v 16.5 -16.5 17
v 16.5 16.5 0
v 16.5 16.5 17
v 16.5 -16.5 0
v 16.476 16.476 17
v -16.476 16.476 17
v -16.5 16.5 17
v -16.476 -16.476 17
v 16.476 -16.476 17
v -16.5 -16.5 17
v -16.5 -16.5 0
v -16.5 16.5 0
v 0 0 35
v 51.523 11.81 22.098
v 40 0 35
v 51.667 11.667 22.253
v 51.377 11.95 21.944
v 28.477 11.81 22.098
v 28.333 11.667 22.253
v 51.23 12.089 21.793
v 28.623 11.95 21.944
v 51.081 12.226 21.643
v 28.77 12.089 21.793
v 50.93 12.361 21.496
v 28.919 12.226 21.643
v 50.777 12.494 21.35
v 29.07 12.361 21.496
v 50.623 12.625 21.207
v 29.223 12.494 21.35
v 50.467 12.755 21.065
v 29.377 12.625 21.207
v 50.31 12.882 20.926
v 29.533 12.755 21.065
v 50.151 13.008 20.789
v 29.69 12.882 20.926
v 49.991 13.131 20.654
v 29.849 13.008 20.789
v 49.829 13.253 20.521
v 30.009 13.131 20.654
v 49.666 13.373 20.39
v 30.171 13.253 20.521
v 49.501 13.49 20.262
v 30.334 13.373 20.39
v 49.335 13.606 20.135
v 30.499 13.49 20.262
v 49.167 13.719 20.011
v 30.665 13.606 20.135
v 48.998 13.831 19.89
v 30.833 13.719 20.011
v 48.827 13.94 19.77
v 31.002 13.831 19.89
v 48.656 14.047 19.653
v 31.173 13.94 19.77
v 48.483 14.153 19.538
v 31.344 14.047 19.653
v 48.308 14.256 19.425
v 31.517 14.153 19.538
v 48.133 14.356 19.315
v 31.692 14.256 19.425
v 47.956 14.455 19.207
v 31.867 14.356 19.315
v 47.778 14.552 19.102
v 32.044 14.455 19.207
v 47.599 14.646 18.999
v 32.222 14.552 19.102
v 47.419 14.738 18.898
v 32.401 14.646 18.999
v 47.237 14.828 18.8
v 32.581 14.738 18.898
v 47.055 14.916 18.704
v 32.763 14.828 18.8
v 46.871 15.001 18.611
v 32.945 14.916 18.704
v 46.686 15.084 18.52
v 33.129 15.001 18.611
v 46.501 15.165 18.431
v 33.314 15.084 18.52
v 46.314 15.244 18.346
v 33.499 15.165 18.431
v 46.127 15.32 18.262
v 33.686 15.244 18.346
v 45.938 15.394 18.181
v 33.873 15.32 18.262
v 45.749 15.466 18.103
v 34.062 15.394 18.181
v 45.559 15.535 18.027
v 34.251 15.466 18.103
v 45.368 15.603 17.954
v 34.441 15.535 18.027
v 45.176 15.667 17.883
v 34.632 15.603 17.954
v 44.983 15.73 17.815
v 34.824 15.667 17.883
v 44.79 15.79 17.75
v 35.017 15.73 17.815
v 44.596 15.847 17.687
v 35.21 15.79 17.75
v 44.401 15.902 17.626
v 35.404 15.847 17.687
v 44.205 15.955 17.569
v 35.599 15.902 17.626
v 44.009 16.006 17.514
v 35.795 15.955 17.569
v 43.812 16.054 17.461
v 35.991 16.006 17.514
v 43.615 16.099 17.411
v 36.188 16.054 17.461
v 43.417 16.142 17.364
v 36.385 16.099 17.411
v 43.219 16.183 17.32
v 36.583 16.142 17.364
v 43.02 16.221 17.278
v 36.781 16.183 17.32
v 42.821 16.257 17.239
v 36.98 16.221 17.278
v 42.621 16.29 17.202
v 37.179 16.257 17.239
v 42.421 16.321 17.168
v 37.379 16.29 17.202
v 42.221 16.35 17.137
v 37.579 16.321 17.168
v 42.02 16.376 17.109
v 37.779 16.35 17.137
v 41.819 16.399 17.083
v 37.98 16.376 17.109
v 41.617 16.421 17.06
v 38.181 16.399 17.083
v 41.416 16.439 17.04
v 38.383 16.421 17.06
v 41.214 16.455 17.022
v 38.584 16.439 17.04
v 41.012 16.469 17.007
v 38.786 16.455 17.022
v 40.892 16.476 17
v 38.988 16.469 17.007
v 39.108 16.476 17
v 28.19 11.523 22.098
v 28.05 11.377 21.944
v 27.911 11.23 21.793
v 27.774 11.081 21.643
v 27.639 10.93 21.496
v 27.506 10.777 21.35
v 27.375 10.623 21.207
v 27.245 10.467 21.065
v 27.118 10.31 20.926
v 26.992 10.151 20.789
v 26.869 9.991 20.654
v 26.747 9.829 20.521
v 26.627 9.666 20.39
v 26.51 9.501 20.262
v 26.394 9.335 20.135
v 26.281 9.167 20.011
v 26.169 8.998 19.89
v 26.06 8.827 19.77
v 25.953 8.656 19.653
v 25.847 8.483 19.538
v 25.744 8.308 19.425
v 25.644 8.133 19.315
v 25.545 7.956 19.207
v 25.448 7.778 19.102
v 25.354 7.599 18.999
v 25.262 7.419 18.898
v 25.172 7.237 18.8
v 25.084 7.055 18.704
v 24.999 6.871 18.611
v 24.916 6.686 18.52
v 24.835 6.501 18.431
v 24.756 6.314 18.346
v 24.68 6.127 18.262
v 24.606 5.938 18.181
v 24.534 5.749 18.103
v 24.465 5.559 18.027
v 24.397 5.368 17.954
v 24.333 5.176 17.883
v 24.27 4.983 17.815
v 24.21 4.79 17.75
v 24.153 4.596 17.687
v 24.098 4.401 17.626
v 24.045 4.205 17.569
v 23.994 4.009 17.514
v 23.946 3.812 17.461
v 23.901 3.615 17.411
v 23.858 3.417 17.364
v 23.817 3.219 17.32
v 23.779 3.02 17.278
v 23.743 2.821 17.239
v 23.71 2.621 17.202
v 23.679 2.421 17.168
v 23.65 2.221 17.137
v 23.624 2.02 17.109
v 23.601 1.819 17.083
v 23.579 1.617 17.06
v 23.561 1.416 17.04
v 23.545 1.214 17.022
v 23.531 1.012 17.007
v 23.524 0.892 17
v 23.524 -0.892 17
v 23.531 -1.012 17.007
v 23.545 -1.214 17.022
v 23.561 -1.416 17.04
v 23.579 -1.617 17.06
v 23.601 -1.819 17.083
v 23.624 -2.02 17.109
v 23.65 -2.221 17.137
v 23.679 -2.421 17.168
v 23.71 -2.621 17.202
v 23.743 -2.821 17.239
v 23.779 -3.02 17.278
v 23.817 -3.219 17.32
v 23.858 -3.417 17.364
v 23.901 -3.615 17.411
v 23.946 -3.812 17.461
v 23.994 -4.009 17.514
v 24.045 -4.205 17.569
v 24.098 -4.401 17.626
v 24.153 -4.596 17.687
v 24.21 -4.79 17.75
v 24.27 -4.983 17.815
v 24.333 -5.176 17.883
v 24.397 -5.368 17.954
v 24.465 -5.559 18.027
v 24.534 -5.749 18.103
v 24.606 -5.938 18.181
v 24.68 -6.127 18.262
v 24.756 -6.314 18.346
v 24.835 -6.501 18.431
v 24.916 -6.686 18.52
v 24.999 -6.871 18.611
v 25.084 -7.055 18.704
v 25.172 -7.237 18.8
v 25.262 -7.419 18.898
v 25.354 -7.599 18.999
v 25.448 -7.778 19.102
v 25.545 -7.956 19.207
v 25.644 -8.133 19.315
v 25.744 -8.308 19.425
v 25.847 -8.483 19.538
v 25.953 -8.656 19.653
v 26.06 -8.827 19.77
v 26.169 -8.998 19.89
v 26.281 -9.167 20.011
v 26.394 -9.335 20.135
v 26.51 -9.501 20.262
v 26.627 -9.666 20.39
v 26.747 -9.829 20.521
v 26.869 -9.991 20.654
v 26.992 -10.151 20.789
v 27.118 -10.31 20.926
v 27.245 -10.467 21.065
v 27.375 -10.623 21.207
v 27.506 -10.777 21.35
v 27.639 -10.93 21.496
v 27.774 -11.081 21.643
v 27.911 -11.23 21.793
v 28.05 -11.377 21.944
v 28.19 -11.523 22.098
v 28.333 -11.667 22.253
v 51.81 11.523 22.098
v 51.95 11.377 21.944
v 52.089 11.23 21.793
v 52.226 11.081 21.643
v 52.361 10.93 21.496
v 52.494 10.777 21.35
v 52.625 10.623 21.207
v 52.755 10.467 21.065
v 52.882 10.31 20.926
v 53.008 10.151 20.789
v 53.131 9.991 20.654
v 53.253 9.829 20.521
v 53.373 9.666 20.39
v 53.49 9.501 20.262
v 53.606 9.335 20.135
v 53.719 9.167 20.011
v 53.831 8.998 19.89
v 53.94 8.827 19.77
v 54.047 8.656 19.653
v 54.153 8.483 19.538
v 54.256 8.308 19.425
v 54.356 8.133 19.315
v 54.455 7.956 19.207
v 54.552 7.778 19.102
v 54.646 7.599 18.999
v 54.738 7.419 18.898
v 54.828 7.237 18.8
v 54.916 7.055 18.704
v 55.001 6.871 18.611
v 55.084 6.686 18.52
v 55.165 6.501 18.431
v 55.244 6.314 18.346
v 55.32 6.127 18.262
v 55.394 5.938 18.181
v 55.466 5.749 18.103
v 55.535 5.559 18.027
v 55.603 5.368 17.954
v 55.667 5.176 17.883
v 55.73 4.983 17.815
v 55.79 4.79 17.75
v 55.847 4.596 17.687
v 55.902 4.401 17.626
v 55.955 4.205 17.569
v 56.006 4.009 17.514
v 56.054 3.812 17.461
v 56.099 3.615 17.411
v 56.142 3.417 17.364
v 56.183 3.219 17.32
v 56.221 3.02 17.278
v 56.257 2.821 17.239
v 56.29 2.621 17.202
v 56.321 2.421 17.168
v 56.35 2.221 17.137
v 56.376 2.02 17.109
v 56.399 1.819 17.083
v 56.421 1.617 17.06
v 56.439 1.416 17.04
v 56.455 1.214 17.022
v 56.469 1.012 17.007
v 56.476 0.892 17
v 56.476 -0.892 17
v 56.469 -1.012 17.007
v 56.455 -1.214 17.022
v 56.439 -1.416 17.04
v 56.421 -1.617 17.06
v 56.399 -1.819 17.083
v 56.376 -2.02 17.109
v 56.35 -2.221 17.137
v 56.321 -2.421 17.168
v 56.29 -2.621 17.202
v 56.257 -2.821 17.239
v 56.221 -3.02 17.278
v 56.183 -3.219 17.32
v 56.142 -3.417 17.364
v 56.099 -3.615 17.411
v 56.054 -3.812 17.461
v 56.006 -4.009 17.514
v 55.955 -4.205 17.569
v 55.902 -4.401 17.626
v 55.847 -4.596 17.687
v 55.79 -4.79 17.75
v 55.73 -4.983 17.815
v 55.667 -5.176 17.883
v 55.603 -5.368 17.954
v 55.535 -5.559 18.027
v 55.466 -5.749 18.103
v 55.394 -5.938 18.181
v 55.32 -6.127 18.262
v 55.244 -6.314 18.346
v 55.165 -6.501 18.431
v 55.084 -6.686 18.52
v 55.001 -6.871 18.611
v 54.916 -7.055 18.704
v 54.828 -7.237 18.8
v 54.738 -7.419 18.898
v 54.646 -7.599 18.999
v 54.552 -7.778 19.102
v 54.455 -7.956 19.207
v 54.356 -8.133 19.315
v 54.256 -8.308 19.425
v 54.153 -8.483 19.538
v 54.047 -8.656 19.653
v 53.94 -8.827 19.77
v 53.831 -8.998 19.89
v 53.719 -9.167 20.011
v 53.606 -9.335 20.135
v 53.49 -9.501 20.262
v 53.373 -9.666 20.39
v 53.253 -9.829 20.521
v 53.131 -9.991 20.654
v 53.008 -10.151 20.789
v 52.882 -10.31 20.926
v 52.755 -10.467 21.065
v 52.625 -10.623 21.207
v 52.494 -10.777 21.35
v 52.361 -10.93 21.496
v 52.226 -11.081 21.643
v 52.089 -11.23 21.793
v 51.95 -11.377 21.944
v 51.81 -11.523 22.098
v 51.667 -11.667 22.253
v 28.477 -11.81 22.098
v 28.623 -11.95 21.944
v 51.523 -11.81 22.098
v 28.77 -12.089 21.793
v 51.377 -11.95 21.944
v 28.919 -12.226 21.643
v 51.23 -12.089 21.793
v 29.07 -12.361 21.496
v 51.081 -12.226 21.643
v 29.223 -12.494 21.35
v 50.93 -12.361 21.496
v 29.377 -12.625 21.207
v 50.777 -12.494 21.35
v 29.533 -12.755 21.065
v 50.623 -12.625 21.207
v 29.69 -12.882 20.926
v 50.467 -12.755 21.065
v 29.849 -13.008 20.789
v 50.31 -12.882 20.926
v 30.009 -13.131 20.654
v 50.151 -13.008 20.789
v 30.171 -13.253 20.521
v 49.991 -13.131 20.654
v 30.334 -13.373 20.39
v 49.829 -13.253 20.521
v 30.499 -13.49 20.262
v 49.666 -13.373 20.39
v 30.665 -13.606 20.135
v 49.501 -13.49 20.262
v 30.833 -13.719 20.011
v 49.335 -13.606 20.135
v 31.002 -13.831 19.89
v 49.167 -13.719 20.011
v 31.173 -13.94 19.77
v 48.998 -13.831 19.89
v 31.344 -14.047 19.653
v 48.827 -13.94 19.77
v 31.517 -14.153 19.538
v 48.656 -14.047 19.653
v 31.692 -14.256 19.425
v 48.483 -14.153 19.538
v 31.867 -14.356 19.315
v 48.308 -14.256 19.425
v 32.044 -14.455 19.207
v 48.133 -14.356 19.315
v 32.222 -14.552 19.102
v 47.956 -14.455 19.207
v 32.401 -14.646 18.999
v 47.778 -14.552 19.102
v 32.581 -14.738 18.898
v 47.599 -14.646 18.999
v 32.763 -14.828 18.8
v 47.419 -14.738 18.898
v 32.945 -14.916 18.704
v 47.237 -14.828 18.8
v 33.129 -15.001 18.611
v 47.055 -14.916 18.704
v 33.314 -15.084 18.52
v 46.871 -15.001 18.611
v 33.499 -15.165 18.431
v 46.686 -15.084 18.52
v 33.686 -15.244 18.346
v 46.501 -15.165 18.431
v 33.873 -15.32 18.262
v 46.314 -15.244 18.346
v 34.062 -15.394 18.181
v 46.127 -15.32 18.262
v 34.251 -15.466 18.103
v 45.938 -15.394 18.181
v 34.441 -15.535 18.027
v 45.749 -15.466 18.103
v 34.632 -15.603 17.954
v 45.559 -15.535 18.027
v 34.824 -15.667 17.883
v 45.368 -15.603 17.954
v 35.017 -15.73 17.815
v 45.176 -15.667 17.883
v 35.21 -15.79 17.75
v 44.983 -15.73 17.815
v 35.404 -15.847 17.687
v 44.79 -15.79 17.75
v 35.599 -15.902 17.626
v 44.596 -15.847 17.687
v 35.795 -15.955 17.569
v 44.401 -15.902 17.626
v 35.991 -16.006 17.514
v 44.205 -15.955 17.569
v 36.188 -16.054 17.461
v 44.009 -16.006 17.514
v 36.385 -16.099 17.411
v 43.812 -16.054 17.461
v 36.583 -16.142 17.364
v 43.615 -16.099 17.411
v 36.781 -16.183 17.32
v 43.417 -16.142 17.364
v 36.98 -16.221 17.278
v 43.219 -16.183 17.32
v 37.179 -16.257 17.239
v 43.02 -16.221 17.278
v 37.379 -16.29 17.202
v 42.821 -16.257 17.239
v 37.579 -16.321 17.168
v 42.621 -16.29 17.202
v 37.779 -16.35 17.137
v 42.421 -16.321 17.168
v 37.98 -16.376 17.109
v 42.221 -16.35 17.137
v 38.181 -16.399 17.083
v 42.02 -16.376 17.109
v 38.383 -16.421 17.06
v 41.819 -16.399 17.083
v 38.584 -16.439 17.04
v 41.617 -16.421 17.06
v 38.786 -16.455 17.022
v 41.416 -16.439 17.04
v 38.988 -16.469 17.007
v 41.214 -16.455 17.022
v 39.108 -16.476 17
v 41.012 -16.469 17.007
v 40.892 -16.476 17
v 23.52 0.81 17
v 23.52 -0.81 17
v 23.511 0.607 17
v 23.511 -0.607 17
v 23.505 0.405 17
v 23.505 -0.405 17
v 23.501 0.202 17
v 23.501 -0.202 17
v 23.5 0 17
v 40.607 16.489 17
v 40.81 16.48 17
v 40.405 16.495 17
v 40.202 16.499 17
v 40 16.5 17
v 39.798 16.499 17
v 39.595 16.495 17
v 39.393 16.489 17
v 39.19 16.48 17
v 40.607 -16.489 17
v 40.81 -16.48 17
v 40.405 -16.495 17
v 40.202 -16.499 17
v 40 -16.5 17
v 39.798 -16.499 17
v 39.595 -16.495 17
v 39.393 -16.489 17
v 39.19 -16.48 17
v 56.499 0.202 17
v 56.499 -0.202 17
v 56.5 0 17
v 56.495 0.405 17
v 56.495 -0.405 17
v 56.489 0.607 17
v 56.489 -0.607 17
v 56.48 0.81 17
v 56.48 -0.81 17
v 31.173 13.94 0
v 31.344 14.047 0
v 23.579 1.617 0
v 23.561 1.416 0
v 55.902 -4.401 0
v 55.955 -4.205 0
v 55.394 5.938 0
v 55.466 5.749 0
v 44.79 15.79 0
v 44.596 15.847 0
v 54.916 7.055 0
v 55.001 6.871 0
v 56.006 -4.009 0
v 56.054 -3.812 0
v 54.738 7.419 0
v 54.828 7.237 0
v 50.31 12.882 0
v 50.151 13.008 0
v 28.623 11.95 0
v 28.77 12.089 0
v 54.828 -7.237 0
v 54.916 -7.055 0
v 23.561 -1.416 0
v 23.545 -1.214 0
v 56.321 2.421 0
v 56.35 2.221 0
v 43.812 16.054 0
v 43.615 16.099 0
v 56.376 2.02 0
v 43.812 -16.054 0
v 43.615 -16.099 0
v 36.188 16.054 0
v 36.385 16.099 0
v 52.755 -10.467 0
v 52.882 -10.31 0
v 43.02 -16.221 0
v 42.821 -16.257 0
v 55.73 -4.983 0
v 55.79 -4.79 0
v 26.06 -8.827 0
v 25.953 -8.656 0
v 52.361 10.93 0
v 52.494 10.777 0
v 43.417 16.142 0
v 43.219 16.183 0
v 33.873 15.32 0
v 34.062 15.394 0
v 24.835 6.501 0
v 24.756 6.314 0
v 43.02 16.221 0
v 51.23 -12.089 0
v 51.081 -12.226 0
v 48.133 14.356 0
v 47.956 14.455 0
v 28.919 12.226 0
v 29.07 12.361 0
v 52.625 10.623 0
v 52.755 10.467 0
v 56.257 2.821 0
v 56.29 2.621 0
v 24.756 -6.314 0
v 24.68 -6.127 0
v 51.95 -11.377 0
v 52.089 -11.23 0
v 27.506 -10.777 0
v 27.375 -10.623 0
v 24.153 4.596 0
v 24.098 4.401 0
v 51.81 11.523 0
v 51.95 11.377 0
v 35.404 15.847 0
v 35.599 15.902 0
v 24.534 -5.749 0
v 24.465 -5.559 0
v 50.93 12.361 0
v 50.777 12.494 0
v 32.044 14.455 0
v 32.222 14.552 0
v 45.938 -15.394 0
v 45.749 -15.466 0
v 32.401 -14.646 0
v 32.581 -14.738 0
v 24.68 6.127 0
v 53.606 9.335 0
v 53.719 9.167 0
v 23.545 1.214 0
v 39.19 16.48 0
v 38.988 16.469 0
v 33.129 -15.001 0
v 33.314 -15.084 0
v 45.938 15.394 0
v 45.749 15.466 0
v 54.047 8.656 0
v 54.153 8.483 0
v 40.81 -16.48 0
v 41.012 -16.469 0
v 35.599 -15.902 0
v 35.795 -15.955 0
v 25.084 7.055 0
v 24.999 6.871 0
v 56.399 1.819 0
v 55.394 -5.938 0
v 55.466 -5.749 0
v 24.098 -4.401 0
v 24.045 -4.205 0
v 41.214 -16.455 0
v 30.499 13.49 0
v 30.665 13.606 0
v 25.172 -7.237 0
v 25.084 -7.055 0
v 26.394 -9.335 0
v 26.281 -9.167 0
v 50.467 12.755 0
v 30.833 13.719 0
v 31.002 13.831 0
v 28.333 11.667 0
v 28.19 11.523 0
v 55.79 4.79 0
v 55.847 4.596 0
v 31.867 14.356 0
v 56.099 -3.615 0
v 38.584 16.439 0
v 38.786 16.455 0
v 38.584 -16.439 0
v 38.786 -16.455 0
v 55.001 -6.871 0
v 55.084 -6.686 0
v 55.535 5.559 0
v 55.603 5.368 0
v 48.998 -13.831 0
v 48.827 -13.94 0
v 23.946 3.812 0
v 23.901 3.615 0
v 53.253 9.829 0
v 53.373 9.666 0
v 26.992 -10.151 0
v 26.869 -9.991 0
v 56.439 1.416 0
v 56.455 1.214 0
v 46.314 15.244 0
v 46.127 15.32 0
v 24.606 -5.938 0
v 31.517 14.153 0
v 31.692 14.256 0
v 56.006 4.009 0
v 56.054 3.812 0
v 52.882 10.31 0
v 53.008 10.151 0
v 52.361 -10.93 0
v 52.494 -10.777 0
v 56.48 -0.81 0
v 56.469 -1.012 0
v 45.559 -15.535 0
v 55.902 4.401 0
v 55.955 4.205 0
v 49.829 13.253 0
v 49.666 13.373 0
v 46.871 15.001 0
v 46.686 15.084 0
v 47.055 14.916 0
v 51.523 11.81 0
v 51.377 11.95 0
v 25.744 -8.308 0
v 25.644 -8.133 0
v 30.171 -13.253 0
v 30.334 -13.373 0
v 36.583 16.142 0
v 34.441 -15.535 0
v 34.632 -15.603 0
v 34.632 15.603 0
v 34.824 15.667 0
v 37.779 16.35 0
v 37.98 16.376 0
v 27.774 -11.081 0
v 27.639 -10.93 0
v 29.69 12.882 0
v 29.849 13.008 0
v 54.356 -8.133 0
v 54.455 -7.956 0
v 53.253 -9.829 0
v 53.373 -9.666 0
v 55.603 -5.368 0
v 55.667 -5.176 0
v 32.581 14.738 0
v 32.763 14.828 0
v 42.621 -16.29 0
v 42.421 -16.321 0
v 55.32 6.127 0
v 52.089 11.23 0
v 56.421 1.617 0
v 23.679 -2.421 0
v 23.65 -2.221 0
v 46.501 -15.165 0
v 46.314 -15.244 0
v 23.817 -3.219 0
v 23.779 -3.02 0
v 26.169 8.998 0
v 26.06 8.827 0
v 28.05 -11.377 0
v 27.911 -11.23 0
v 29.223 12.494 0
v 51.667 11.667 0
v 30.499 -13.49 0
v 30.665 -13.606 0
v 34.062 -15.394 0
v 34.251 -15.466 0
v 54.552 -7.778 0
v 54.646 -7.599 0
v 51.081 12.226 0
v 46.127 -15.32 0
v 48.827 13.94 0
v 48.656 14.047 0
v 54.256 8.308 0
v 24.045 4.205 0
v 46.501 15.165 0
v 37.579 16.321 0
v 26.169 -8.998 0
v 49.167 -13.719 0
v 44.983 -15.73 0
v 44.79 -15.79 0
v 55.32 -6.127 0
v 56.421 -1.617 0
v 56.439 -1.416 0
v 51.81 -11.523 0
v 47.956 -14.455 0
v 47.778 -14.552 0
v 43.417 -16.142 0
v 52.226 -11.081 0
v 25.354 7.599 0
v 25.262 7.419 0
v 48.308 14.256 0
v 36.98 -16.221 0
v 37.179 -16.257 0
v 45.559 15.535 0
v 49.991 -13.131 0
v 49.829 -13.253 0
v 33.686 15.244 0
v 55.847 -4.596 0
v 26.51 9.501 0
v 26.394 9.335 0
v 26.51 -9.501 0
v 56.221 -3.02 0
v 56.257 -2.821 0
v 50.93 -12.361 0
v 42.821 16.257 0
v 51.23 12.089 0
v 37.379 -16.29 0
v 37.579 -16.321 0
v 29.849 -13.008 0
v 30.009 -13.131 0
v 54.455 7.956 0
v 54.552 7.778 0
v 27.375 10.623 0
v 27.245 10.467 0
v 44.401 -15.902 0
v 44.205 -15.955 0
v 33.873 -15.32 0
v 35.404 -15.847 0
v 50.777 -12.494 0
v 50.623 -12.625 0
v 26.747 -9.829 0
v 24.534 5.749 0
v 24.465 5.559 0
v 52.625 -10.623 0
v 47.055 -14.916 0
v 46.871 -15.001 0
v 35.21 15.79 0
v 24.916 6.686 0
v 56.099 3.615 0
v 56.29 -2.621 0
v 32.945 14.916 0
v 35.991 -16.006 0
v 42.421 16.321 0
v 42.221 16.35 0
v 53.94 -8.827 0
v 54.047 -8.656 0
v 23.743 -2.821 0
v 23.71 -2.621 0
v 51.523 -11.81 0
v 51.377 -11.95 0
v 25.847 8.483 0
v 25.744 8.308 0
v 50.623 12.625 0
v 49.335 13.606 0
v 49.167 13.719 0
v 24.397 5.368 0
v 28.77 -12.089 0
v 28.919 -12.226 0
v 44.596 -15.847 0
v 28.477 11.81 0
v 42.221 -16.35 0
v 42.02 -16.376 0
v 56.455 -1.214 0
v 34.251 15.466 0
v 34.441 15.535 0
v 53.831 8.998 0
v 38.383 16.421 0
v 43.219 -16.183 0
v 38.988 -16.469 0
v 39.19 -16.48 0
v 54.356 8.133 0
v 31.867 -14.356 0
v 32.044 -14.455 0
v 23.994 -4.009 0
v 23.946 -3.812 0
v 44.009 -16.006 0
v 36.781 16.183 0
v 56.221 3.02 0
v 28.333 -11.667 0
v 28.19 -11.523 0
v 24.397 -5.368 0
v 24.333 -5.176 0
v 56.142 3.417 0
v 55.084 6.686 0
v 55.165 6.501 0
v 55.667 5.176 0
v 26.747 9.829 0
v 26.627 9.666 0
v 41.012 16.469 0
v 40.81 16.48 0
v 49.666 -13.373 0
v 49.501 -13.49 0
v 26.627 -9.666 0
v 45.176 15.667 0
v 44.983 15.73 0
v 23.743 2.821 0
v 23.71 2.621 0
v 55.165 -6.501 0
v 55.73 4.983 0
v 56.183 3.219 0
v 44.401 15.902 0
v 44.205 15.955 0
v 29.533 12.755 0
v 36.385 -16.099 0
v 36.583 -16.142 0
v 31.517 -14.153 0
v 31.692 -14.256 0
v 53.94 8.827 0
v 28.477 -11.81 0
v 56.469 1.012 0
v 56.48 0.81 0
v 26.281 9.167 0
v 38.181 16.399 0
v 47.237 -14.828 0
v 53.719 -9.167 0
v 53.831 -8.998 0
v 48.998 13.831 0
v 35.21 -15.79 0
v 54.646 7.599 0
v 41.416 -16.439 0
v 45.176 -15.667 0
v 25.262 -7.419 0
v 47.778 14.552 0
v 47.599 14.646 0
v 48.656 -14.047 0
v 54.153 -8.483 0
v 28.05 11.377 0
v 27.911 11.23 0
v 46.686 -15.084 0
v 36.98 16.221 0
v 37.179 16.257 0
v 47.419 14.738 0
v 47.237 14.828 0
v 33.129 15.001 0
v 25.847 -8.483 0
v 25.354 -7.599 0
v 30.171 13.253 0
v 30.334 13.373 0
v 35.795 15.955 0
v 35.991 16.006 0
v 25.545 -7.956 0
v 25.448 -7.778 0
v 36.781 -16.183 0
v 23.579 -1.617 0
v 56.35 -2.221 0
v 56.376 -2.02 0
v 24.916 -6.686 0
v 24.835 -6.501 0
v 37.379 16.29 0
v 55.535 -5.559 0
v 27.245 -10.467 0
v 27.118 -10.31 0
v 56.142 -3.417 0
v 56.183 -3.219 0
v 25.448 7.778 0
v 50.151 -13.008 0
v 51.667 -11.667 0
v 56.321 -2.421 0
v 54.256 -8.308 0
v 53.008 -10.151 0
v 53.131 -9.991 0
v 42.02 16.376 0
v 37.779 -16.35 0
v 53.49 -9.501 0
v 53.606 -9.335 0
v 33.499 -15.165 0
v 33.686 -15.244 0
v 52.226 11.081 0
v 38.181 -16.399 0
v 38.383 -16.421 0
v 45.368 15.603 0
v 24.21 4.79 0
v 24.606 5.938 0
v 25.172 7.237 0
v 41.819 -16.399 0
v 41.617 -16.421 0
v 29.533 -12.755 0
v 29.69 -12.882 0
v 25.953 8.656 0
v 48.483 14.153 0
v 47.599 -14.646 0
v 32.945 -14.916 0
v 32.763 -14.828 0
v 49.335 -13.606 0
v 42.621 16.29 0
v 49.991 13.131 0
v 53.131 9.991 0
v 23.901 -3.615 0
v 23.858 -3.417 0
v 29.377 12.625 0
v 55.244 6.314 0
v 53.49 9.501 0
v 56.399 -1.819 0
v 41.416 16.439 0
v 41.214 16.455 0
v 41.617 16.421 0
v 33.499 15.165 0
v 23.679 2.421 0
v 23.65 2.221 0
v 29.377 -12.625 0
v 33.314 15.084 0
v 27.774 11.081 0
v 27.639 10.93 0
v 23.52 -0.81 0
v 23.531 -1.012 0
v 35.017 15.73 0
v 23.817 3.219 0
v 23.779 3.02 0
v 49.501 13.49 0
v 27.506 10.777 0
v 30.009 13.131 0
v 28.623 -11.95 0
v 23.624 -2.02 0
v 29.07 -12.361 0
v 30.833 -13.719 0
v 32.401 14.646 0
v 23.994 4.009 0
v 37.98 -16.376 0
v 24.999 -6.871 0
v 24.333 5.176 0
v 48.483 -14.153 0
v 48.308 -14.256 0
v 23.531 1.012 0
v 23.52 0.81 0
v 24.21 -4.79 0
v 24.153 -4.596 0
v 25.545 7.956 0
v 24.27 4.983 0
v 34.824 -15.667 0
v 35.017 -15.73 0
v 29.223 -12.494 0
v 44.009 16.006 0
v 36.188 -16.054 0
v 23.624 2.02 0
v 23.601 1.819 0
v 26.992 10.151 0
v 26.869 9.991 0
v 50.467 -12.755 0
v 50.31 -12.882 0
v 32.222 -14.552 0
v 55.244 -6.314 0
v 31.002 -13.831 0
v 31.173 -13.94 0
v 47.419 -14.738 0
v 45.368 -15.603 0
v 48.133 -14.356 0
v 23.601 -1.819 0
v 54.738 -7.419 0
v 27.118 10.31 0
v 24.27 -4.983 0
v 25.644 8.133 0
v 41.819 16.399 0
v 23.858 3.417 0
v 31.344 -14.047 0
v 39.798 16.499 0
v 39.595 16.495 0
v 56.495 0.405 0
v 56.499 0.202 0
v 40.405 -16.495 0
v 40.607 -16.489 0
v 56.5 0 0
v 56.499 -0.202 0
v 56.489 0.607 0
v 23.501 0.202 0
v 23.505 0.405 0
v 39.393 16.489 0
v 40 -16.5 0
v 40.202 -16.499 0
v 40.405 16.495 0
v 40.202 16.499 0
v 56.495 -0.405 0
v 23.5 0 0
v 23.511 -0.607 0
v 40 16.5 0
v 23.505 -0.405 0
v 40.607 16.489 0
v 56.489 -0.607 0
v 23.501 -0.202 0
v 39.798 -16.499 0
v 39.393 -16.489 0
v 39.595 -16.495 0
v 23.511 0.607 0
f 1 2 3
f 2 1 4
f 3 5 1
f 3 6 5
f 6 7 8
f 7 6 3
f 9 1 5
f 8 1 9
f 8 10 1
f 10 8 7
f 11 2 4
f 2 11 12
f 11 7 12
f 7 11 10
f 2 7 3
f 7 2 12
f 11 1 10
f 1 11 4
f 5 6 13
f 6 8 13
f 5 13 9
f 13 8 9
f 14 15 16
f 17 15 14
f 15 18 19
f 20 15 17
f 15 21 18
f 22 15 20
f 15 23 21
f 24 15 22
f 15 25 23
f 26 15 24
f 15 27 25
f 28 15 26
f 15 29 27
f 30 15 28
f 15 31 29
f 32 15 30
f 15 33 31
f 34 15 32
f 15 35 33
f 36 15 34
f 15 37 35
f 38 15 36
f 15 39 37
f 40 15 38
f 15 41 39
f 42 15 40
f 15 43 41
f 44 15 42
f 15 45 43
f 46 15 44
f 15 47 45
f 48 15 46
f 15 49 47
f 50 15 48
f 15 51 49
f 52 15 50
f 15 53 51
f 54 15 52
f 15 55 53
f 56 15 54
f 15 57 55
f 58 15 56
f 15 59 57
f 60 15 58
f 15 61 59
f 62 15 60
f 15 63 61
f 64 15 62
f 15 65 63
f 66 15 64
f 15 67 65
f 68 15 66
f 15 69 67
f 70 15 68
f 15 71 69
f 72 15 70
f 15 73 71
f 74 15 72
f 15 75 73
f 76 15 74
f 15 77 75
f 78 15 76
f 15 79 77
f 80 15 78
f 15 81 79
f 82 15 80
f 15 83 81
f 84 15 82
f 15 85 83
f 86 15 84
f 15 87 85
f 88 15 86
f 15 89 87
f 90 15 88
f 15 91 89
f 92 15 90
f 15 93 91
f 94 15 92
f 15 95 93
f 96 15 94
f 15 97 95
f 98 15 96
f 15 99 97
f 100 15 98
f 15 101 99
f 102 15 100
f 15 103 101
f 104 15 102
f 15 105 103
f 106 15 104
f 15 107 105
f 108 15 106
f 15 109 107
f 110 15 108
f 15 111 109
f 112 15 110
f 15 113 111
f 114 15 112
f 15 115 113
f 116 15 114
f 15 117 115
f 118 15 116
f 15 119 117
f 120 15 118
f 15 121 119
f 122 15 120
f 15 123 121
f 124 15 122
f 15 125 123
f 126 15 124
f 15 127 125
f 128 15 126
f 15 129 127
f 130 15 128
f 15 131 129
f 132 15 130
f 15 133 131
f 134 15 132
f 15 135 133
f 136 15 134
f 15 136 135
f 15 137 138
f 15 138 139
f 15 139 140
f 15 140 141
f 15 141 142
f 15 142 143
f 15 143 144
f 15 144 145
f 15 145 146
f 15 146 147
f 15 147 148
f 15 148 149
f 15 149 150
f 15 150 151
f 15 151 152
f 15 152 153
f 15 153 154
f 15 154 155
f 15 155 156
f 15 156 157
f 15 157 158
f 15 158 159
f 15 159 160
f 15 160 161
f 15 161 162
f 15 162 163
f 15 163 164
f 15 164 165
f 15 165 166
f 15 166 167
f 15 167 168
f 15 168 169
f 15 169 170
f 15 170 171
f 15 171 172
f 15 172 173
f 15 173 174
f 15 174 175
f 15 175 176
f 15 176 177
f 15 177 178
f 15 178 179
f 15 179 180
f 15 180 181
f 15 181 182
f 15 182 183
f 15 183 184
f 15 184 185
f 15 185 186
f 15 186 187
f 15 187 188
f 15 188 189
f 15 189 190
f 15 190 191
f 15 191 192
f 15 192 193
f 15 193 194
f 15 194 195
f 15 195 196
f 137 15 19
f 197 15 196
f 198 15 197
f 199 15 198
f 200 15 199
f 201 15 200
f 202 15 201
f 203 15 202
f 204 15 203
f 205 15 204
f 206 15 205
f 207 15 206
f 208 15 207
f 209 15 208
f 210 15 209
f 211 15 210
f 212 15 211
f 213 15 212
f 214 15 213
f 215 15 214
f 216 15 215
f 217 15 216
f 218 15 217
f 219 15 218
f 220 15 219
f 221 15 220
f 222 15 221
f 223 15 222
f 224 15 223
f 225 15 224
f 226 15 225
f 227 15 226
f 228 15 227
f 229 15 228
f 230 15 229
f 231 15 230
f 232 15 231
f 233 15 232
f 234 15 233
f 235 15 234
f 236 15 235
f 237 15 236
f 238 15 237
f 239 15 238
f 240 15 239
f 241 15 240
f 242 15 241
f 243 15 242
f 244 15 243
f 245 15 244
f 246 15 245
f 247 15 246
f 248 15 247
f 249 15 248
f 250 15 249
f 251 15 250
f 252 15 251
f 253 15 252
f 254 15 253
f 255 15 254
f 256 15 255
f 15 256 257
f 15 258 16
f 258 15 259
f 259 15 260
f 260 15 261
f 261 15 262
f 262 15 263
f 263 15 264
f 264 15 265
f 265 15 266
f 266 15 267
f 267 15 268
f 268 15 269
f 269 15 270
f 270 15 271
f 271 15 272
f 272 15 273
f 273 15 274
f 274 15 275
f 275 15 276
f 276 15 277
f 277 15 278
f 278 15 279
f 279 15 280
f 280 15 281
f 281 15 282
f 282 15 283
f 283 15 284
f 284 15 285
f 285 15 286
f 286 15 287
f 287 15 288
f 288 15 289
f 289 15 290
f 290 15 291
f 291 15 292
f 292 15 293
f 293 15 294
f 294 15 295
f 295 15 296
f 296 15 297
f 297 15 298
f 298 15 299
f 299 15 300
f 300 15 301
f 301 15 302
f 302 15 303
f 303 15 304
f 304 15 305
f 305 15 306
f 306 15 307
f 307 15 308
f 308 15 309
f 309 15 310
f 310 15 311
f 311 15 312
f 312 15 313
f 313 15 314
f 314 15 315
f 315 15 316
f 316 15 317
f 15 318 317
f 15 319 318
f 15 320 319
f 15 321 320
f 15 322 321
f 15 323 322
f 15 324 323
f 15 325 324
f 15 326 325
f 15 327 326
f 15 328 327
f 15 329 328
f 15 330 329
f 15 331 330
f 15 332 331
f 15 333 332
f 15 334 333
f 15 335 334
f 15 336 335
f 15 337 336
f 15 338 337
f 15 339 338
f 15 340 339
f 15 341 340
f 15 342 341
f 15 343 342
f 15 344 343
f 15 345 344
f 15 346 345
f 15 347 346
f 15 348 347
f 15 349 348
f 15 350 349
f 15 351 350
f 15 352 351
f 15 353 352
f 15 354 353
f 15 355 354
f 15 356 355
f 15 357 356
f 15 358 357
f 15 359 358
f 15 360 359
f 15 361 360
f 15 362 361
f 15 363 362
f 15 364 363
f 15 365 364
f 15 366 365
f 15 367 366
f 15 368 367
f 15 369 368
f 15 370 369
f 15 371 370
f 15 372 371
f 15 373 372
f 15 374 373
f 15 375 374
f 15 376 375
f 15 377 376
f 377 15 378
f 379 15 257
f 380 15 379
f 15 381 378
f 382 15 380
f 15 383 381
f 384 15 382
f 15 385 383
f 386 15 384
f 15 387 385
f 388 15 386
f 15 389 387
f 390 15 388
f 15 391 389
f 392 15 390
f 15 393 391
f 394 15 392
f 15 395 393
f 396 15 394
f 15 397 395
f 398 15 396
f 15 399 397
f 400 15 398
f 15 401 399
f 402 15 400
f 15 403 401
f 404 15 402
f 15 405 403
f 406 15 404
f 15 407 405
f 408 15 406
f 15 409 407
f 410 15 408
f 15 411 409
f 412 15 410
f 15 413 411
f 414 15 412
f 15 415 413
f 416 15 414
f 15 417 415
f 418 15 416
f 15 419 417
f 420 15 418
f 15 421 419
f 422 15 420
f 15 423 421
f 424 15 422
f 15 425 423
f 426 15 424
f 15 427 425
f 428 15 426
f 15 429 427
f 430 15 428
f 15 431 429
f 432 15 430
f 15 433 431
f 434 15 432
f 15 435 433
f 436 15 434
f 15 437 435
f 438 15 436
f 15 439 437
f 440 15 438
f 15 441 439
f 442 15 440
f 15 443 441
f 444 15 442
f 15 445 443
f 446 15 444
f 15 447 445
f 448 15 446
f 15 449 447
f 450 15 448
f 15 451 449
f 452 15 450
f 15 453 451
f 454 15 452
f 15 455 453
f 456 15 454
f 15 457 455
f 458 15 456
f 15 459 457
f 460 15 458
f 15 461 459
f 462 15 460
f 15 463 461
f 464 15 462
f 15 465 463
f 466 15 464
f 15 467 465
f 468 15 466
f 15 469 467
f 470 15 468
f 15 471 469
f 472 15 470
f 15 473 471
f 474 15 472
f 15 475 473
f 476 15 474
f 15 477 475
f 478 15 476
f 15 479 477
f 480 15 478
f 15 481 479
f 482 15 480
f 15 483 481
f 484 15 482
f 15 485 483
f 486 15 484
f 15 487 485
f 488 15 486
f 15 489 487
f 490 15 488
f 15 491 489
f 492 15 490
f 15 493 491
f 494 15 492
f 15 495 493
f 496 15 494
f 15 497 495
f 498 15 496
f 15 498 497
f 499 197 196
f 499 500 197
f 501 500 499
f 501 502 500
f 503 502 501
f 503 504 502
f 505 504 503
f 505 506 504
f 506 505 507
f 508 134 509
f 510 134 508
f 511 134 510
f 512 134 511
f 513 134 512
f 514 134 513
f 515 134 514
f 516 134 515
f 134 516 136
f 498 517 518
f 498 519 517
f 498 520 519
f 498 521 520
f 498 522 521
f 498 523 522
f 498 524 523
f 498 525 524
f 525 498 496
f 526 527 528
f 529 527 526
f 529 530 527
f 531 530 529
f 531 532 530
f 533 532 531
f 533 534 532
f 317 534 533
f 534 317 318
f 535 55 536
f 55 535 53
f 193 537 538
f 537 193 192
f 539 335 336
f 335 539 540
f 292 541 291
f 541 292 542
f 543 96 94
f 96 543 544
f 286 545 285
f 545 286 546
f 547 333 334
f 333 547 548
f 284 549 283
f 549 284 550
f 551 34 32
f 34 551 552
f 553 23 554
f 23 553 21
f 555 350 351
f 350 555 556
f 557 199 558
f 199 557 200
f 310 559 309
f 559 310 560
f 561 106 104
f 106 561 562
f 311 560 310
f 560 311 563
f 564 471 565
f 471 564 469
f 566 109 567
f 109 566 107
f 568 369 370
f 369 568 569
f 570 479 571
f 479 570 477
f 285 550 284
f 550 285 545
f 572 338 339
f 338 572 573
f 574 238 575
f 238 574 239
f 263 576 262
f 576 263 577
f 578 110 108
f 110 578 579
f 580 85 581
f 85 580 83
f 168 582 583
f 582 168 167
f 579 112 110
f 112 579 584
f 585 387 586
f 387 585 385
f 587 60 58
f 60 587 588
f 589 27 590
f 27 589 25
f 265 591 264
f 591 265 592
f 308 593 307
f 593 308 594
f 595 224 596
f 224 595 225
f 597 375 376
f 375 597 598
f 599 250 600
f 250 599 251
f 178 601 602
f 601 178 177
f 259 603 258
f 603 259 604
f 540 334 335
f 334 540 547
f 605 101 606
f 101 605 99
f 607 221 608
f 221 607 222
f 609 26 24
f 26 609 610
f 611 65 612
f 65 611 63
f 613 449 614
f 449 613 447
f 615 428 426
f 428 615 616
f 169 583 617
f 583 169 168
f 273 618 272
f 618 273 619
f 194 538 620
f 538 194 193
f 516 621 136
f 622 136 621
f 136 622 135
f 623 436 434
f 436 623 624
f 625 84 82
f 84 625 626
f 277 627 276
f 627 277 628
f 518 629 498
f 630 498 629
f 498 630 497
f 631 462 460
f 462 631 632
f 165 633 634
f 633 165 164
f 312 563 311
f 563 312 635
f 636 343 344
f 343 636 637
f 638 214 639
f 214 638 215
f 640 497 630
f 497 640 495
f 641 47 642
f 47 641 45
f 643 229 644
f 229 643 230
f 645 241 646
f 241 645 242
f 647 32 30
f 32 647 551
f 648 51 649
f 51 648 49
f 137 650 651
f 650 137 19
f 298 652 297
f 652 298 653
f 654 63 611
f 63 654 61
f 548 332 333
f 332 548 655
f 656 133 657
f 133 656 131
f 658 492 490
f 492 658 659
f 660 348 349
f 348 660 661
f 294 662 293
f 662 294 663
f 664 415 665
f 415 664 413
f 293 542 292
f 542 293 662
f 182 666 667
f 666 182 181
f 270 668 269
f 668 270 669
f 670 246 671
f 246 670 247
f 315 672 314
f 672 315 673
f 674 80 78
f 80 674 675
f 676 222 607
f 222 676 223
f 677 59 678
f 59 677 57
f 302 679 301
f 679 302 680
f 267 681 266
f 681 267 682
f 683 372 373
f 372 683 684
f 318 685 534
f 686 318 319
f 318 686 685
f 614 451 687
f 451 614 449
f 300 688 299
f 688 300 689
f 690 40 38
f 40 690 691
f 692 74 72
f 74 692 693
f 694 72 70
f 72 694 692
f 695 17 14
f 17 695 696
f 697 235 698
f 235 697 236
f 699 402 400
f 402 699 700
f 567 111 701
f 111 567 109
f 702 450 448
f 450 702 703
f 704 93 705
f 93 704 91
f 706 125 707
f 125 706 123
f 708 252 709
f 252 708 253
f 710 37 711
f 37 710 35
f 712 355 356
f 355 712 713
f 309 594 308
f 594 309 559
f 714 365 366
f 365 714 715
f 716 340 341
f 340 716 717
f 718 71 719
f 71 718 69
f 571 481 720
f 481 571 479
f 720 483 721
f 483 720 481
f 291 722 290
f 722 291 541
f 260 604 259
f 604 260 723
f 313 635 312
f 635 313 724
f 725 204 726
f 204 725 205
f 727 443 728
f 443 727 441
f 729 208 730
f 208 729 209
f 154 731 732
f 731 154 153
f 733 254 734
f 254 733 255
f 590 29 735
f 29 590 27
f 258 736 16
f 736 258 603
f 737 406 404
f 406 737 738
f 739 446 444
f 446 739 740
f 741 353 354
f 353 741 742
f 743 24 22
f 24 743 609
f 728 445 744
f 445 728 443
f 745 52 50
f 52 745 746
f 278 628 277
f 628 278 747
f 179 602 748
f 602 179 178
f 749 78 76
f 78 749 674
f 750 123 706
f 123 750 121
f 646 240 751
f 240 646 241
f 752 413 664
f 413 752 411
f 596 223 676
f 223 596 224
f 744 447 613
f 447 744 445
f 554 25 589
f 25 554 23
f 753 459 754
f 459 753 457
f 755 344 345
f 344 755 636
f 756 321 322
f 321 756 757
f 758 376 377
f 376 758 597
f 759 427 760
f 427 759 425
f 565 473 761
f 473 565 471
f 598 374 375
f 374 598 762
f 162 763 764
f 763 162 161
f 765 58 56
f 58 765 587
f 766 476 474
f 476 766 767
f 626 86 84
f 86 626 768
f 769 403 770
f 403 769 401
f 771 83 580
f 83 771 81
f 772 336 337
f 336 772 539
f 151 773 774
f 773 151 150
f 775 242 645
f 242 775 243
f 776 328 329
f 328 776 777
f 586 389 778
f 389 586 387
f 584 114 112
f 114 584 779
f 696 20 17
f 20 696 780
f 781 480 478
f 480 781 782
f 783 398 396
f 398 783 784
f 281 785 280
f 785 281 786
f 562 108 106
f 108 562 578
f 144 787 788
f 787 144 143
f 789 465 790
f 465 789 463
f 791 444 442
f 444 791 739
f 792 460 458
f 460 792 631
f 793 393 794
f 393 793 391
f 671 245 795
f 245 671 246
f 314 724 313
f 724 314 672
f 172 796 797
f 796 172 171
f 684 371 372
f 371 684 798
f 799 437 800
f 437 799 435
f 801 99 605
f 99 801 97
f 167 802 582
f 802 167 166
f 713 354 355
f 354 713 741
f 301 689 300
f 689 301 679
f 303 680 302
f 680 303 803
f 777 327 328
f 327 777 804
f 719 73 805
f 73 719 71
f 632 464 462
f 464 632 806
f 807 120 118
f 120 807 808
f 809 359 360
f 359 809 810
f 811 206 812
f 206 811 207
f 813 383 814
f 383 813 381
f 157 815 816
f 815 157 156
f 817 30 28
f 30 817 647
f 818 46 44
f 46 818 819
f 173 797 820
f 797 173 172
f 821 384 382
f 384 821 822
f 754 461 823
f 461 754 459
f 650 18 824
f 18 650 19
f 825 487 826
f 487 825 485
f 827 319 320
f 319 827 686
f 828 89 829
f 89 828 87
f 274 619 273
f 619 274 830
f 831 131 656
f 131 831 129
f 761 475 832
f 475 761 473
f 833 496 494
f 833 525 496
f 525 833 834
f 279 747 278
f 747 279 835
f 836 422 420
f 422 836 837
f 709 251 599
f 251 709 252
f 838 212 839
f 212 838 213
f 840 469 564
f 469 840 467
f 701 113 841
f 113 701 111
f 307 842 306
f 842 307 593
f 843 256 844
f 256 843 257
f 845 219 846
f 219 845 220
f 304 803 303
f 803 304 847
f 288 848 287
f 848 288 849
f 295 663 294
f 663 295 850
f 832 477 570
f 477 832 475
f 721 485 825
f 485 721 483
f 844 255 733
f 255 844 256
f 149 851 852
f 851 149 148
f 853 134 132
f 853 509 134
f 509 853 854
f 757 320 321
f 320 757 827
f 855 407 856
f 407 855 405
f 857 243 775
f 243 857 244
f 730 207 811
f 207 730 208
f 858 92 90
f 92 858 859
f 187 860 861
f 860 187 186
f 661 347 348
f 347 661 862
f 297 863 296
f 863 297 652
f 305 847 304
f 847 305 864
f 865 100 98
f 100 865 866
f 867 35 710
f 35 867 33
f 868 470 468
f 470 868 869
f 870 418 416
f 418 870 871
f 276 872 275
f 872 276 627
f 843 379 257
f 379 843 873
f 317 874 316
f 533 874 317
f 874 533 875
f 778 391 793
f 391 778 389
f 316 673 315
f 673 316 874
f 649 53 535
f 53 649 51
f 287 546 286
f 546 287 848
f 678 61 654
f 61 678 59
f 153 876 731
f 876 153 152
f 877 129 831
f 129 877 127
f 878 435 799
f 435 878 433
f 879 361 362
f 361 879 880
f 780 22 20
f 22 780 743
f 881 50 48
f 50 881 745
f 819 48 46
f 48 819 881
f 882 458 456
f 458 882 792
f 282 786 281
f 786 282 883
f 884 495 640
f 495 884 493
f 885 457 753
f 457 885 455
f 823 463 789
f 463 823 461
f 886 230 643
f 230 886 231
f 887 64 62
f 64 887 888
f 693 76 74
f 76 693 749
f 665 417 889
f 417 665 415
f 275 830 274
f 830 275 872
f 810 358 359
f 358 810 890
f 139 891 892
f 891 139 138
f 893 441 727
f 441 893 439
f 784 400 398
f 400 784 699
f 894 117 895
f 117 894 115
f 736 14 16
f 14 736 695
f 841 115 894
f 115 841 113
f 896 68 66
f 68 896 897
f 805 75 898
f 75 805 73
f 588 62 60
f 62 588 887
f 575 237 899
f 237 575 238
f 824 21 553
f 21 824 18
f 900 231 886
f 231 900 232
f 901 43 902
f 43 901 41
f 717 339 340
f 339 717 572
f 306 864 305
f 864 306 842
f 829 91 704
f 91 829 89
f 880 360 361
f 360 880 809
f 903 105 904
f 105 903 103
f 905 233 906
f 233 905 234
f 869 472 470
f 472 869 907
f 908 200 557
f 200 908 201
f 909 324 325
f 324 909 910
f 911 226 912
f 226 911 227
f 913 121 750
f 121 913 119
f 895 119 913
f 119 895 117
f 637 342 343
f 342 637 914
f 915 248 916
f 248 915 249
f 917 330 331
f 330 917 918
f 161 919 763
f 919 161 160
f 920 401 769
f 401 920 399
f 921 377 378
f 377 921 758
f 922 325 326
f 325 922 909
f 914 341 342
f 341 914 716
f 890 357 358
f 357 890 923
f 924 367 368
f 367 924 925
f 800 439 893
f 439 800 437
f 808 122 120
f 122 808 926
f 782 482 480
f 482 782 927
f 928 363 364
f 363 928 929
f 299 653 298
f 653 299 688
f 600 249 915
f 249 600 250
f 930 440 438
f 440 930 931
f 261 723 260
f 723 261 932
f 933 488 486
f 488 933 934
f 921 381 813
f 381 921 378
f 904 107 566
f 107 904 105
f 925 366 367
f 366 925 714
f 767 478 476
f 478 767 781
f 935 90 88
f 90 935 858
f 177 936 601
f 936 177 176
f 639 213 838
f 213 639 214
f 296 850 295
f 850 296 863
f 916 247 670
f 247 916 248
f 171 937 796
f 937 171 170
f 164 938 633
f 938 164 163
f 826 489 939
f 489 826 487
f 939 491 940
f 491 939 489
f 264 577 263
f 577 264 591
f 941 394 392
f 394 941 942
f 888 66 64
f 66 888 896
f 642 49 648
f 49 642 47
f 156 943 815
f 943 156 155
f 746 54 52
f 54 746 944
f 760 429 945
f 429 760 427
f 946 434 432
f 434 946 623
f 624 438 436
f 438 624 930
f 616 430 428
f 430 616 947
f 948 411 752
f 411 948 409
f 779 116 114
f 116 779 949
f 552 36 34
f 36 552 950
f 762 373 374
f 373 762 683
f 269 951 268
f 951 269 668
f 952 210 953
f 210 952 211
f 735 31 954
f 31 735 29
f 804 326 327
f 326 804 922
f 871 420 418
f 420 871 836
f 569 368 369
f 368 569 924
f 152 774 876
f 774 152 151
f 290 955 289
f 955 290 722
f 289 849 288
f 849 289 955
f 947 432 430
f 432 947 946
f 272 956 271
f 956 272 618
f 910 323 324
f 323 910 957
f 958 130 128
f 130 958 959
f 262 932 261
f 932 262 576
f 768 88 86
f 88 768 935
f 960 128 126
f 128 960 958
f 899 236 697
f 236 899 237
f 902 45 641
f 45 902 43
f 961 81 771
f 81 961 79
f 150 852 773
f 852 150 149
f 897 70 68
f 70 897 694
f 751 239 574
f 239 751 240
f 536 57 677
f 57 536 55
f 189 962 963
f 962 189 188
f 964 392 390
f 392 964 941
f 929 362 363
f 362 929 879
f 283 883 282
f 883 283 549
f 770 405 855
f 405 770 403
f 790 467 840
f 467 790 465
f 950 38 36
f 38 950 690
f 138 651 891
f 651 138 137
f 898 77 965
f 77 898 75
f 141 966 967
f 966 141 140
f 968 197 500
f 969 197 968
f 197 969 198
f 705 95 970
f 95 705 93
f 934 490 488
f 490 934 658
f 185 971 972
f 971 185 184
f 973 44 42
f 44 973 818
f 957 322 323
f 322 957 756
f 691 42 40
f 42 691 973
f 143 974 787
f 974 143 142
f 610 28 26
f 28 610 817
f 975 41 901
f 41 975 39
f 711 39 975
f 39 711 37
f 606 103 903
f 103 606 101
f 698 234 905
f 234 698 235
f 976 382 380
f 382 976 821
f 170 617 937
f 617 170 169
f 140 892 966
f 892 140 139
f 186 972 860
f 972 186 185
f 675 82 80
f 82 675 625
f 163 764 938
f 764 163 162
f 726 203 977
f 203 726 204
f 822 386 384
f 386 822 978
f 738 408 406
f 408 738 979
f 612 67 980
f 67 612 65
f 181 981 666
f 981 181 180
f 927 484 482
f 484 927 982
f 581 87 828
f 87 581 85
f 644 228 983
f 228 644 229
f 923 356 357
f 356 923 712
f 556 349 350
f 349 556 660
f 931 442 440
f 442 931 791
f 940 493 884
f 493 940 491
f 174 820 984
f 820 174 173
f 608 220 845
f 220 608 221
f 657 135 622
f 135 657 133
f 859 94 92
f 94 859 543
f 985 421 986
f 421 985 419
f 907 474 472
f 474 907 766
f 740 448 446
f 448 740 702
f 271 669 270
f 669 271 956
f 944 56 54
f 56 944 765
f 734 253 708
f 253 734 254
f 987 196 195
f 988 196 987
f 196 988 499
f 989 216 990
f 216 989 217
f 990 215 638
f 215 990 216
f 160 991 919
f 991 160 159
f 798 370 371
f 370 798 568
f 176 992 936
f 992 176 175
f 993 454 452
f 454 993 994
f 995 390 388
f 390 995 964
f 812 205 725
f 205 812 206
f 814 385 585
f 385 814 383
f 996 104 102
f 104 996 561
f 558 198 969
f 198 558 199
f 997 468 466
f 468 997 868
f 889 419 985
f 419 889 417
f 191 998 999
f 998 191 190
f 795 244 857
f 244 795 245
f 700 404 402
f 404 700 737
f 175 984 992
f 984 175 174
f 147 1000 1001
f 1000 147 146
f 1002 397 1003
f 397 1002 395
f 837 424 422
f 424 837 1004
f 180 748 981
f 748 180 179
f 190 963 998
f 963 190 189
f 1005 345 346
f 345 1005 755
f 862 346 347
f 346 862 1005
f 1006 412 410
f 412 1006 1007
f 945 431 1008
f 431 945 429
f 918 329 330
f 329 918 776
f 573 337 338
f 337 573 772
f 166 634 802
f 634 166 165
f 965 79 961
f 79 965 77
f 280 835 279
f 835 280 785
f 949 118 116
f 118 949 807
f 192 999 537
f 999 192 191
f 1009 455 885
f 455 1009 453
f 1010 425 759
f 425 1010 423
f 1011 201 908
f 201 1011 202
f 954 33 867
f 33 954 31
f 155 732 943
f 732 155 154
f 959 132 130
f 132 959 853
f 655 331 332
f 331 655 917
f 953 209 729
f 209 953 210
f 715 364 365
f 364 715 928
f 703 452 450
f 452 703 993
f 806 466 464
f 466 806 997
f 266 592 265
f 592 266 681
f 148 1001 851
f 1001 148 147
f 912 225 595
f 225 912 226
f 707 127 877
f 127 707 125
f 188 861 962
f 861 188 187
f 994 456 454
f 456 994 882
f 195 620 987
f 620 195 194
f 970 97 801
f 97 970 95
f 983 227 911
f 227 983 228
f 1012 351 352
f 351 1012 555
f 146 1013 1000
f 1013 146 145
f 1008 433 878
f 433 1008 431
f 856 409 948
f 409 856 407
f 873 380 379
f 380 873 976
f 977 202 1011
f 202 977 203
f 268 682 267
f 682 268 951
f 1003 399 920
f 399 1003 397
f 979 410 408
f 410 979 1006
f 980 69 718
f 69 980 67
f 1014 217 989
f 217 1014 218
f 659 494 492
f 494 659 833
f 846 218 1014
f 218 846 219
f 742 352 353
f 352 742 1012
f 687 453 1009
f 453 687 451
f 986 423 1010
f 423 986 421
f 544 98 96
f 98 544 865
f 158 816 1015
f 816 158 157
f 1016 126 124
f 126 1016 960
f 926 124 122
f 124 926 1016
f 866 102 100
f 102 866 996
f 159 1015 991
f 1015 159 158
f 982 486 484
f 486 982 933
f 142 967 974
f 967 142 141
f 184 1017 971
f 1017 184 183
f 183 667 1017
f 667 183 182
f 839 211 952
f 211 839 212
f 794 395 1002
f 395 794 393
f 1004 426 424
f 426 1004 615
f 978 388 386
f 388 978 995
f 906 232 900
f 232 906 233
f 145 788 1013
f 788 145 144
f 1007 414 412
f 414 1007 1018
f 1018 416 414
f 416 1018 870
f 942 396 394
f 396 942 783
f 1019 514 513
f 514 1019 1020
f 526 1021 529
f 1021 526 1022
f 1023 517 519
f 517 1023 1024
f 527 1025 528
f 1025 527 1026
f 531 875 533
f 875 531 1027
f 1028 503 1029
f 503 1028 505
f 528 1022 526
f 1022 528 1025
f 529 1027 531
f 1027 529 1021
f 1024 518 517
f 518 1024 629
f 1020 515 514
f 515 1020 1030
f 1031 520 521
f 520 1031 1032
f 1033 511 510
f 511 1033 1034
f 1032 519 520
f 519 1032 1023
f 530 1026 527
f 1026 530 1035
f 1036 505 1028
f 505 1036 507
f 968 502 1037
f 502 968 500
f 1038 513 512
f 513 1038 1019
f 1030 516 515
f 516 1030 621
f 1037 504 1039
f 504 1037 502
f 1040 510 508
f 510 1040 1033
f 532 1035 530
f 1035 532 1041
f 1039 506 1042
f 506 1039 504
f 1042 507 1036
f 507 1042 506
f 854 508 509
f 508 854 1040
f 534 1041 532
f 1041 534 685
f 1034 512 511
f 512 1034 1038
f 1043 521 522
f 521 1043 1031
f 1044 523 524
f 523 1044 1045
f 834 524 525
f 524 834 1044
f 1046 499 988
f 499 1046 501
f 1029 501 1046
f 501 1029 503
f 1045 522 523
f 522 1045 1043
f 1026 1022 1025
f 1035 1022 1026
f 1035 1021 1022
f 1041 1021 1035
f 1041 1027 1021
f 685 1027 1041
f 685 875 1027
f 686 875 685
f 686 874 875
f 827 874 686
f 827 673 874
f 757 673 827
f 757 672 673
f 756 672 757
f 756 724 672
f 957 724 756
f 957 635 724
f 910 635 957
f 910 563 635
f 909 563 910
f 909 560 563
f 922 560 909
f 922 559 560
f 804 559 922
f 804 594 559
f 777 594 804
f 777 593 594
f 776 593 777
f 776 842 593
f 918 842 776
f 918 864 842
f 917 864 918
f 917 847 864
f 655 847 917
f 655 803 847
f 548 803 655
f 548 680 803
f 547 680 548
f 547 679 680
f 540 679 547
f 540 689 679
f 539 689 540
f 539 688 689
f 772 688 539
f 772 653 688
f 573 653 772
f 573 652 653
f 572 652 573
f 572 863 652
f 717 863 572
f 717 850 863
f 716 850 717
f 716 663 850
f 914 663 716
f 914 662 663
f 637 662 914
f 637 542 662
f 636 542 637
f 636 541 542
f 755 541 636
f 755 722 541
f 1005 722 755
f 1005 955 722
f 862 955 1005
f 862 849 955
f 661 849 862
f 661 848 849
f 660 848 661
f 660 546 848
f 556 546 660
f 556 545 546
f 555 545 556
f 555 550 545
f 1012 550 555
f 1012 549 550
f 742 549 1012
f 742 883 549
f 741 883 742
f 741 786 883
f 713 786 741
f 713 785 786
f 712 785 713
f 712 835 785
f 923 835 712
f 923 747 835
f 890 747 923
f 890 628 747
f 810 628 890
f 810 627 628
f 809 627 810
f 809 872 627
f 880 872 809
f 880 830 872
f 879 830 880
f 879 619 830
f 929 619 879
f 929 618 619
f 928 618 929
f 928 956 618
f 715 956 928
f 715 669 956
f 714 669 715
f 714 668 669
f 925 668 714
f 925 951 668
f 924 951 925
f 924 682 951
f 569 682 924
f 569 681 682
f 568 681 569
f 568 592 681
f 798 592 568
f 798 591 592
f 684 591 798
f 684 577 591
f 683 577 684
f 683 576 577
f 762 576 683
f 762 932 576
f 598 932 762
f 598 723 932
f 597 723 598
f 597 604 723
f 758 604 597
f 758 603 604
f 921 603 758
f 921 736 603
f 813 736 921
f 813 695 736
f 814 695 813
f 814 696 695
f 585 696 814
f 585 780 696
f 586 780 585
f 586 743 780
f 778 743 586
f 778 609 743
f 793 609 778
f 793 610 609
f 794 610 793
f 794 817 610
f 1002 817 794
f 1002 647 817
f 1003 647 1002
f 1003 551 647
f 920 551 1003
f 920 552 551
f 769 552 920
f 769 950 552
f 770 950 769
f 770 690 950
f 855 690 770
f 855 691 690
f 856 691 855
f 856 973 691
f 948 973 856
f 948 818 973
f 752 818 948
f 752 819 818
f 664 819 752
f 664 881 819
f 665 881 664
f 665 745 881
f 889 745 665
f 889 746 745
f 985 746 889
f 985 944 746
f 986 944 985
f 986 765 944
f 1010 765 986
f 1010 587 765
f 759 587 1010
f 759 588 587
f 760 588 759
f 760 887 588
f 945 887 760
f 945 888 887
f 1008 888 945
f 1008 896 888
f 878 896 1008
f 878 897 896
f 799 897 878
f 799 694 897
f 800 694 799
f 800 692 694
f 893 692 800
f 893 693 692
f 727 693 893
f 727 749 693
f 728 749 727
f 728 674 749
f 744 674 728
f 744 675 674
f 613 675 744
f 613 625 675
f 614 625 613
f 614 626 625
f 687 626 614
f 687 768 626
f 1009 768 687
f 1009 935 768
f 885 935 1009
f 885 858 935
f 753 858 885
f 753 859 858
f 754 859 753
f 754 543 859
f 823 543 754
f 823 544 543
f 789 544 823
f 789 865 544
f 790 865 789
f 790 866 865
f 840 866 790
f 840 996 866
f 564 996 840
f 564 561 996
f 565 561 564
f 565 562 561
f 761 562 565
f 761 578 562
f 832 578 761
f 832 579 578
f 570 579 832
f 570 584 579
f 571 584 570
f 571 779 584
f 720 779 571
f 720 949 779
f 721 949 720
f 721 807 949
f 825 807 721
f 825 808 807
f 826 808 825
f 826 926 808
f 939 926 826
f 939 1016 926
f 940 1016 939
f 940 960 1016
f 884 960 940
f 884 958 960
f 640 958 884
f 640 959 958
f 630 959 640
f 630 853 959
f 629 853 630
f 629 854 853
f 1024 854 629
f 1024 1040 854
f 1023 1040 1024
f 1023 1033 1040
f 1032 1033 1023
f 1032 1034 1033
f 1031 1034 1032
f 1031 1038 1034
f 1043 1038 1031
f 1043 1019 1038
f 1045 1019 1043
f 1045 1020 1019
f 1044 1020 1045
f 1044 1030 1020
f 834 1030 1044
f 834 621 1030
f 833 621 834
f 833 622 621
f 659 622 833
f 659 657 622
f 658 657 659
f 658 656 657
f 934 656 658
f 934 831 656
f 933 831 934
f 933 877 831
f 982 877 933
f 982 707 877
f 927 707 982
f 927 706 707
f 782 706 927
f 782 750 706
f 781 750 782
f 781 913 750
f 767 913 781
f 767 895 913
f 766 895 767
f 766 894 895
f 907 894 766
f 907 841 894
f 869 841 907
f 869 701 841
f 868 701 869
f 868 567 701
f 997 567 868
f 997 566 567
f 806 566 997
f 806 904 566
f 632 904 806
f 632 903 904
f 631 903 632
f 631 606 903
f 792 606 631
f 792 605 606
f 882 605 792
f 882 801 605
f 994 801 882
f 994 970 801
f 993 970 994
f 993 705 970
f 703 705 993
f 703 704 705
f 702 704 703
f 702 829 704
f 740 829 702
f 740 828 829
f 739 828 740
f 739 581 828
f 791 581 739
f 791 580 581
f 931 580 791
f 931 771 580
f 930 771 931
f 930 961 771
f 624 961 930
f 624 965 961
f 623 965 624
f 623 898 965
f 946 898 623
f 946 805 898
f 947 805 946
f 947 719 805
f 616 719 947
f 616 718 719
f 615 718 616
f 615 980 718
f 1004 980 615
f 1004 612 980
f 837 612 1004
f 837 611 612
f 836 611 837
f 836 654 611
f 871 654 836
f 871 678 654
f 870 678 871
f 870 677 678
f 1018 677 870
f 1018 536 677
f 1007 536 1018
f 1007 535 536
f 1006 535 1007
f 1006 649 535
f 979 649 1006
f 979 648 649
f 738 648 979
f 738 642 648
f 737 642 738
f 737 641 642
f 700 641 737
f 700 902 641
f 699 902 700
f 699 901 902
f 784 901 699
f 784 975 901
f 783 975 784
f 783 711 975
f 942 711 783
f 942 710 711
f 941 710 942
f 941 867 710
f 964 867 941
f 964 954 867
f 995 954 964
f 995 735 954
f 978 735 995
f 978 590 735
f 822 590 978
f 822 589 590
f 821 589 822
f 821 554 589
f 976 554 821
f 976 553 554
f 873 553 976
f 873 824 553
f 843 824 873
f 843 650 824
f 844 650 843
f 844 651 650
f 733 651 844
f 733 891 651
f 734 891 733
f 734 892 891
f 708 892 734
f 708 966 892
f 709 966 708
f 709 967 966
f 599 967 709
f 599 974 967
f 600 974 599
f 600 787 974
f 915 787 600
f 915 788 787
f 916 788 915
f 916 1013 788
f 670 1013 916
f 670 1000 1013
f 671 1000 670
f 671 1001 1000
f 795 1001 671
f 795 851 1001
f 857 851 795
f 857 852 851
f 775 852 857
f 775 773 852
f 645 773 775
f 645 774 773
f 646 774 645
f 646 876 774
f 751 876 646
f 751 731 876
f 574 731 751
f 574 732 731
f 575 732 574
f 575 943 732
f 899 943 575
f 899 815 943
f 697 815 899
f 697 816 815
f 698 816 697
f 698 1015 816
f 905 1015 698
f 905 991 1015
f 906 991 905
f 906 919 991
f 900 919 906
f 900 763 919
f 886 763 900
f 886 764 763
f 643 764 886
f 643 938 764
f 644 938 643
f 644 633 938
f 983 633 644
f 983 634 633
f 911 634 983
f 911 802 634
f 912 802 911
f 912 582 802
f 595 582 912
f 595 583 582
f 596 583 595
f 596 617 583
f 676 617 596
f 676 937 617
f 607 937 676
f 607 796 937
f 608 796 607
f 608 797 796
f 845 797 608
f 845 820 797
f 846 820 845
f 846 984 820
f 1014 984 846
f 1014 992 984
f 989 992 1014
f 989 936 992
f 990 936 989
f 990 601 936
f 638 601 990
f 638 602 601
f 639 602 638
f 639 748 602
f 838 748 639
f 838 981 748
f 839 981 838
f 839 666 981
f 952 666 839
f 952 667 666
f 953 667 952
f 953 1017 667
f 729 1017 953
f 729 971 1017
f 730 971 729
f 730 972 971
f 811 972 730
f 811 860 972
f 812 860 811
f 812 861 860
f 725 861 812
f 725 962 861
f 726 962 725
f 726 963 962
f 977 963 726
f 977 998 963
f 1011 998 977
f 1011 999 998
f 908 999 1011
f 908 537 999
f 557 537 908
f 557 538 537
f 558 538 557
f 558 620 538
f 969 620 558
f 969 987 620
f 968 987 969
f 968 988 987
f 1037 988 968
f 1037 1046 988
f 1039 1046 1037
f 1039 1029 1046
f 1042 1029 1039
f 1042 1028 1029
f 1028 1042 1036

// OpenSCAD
union() {
    
    translate([-33/2,-33/2,0])
    cube([33,33,17]);
    
    rotate([0,0,45])
    translate([0,0,17])
    cylinder(d1=46.6, d2=0, h=18, $fn=4);

}

translate([40,0,0])
union() {
    
    
    cylinder(d=33, h=17, $fn=512);
    
    intersection() {
    rotate([0,0,45])
    translate([0,0,17])
    cylinder(d1=46.6, d2=0, h=18, $fn=4);
        
     cylinder(d=33, h=40, $fn=512);   
    }
}
